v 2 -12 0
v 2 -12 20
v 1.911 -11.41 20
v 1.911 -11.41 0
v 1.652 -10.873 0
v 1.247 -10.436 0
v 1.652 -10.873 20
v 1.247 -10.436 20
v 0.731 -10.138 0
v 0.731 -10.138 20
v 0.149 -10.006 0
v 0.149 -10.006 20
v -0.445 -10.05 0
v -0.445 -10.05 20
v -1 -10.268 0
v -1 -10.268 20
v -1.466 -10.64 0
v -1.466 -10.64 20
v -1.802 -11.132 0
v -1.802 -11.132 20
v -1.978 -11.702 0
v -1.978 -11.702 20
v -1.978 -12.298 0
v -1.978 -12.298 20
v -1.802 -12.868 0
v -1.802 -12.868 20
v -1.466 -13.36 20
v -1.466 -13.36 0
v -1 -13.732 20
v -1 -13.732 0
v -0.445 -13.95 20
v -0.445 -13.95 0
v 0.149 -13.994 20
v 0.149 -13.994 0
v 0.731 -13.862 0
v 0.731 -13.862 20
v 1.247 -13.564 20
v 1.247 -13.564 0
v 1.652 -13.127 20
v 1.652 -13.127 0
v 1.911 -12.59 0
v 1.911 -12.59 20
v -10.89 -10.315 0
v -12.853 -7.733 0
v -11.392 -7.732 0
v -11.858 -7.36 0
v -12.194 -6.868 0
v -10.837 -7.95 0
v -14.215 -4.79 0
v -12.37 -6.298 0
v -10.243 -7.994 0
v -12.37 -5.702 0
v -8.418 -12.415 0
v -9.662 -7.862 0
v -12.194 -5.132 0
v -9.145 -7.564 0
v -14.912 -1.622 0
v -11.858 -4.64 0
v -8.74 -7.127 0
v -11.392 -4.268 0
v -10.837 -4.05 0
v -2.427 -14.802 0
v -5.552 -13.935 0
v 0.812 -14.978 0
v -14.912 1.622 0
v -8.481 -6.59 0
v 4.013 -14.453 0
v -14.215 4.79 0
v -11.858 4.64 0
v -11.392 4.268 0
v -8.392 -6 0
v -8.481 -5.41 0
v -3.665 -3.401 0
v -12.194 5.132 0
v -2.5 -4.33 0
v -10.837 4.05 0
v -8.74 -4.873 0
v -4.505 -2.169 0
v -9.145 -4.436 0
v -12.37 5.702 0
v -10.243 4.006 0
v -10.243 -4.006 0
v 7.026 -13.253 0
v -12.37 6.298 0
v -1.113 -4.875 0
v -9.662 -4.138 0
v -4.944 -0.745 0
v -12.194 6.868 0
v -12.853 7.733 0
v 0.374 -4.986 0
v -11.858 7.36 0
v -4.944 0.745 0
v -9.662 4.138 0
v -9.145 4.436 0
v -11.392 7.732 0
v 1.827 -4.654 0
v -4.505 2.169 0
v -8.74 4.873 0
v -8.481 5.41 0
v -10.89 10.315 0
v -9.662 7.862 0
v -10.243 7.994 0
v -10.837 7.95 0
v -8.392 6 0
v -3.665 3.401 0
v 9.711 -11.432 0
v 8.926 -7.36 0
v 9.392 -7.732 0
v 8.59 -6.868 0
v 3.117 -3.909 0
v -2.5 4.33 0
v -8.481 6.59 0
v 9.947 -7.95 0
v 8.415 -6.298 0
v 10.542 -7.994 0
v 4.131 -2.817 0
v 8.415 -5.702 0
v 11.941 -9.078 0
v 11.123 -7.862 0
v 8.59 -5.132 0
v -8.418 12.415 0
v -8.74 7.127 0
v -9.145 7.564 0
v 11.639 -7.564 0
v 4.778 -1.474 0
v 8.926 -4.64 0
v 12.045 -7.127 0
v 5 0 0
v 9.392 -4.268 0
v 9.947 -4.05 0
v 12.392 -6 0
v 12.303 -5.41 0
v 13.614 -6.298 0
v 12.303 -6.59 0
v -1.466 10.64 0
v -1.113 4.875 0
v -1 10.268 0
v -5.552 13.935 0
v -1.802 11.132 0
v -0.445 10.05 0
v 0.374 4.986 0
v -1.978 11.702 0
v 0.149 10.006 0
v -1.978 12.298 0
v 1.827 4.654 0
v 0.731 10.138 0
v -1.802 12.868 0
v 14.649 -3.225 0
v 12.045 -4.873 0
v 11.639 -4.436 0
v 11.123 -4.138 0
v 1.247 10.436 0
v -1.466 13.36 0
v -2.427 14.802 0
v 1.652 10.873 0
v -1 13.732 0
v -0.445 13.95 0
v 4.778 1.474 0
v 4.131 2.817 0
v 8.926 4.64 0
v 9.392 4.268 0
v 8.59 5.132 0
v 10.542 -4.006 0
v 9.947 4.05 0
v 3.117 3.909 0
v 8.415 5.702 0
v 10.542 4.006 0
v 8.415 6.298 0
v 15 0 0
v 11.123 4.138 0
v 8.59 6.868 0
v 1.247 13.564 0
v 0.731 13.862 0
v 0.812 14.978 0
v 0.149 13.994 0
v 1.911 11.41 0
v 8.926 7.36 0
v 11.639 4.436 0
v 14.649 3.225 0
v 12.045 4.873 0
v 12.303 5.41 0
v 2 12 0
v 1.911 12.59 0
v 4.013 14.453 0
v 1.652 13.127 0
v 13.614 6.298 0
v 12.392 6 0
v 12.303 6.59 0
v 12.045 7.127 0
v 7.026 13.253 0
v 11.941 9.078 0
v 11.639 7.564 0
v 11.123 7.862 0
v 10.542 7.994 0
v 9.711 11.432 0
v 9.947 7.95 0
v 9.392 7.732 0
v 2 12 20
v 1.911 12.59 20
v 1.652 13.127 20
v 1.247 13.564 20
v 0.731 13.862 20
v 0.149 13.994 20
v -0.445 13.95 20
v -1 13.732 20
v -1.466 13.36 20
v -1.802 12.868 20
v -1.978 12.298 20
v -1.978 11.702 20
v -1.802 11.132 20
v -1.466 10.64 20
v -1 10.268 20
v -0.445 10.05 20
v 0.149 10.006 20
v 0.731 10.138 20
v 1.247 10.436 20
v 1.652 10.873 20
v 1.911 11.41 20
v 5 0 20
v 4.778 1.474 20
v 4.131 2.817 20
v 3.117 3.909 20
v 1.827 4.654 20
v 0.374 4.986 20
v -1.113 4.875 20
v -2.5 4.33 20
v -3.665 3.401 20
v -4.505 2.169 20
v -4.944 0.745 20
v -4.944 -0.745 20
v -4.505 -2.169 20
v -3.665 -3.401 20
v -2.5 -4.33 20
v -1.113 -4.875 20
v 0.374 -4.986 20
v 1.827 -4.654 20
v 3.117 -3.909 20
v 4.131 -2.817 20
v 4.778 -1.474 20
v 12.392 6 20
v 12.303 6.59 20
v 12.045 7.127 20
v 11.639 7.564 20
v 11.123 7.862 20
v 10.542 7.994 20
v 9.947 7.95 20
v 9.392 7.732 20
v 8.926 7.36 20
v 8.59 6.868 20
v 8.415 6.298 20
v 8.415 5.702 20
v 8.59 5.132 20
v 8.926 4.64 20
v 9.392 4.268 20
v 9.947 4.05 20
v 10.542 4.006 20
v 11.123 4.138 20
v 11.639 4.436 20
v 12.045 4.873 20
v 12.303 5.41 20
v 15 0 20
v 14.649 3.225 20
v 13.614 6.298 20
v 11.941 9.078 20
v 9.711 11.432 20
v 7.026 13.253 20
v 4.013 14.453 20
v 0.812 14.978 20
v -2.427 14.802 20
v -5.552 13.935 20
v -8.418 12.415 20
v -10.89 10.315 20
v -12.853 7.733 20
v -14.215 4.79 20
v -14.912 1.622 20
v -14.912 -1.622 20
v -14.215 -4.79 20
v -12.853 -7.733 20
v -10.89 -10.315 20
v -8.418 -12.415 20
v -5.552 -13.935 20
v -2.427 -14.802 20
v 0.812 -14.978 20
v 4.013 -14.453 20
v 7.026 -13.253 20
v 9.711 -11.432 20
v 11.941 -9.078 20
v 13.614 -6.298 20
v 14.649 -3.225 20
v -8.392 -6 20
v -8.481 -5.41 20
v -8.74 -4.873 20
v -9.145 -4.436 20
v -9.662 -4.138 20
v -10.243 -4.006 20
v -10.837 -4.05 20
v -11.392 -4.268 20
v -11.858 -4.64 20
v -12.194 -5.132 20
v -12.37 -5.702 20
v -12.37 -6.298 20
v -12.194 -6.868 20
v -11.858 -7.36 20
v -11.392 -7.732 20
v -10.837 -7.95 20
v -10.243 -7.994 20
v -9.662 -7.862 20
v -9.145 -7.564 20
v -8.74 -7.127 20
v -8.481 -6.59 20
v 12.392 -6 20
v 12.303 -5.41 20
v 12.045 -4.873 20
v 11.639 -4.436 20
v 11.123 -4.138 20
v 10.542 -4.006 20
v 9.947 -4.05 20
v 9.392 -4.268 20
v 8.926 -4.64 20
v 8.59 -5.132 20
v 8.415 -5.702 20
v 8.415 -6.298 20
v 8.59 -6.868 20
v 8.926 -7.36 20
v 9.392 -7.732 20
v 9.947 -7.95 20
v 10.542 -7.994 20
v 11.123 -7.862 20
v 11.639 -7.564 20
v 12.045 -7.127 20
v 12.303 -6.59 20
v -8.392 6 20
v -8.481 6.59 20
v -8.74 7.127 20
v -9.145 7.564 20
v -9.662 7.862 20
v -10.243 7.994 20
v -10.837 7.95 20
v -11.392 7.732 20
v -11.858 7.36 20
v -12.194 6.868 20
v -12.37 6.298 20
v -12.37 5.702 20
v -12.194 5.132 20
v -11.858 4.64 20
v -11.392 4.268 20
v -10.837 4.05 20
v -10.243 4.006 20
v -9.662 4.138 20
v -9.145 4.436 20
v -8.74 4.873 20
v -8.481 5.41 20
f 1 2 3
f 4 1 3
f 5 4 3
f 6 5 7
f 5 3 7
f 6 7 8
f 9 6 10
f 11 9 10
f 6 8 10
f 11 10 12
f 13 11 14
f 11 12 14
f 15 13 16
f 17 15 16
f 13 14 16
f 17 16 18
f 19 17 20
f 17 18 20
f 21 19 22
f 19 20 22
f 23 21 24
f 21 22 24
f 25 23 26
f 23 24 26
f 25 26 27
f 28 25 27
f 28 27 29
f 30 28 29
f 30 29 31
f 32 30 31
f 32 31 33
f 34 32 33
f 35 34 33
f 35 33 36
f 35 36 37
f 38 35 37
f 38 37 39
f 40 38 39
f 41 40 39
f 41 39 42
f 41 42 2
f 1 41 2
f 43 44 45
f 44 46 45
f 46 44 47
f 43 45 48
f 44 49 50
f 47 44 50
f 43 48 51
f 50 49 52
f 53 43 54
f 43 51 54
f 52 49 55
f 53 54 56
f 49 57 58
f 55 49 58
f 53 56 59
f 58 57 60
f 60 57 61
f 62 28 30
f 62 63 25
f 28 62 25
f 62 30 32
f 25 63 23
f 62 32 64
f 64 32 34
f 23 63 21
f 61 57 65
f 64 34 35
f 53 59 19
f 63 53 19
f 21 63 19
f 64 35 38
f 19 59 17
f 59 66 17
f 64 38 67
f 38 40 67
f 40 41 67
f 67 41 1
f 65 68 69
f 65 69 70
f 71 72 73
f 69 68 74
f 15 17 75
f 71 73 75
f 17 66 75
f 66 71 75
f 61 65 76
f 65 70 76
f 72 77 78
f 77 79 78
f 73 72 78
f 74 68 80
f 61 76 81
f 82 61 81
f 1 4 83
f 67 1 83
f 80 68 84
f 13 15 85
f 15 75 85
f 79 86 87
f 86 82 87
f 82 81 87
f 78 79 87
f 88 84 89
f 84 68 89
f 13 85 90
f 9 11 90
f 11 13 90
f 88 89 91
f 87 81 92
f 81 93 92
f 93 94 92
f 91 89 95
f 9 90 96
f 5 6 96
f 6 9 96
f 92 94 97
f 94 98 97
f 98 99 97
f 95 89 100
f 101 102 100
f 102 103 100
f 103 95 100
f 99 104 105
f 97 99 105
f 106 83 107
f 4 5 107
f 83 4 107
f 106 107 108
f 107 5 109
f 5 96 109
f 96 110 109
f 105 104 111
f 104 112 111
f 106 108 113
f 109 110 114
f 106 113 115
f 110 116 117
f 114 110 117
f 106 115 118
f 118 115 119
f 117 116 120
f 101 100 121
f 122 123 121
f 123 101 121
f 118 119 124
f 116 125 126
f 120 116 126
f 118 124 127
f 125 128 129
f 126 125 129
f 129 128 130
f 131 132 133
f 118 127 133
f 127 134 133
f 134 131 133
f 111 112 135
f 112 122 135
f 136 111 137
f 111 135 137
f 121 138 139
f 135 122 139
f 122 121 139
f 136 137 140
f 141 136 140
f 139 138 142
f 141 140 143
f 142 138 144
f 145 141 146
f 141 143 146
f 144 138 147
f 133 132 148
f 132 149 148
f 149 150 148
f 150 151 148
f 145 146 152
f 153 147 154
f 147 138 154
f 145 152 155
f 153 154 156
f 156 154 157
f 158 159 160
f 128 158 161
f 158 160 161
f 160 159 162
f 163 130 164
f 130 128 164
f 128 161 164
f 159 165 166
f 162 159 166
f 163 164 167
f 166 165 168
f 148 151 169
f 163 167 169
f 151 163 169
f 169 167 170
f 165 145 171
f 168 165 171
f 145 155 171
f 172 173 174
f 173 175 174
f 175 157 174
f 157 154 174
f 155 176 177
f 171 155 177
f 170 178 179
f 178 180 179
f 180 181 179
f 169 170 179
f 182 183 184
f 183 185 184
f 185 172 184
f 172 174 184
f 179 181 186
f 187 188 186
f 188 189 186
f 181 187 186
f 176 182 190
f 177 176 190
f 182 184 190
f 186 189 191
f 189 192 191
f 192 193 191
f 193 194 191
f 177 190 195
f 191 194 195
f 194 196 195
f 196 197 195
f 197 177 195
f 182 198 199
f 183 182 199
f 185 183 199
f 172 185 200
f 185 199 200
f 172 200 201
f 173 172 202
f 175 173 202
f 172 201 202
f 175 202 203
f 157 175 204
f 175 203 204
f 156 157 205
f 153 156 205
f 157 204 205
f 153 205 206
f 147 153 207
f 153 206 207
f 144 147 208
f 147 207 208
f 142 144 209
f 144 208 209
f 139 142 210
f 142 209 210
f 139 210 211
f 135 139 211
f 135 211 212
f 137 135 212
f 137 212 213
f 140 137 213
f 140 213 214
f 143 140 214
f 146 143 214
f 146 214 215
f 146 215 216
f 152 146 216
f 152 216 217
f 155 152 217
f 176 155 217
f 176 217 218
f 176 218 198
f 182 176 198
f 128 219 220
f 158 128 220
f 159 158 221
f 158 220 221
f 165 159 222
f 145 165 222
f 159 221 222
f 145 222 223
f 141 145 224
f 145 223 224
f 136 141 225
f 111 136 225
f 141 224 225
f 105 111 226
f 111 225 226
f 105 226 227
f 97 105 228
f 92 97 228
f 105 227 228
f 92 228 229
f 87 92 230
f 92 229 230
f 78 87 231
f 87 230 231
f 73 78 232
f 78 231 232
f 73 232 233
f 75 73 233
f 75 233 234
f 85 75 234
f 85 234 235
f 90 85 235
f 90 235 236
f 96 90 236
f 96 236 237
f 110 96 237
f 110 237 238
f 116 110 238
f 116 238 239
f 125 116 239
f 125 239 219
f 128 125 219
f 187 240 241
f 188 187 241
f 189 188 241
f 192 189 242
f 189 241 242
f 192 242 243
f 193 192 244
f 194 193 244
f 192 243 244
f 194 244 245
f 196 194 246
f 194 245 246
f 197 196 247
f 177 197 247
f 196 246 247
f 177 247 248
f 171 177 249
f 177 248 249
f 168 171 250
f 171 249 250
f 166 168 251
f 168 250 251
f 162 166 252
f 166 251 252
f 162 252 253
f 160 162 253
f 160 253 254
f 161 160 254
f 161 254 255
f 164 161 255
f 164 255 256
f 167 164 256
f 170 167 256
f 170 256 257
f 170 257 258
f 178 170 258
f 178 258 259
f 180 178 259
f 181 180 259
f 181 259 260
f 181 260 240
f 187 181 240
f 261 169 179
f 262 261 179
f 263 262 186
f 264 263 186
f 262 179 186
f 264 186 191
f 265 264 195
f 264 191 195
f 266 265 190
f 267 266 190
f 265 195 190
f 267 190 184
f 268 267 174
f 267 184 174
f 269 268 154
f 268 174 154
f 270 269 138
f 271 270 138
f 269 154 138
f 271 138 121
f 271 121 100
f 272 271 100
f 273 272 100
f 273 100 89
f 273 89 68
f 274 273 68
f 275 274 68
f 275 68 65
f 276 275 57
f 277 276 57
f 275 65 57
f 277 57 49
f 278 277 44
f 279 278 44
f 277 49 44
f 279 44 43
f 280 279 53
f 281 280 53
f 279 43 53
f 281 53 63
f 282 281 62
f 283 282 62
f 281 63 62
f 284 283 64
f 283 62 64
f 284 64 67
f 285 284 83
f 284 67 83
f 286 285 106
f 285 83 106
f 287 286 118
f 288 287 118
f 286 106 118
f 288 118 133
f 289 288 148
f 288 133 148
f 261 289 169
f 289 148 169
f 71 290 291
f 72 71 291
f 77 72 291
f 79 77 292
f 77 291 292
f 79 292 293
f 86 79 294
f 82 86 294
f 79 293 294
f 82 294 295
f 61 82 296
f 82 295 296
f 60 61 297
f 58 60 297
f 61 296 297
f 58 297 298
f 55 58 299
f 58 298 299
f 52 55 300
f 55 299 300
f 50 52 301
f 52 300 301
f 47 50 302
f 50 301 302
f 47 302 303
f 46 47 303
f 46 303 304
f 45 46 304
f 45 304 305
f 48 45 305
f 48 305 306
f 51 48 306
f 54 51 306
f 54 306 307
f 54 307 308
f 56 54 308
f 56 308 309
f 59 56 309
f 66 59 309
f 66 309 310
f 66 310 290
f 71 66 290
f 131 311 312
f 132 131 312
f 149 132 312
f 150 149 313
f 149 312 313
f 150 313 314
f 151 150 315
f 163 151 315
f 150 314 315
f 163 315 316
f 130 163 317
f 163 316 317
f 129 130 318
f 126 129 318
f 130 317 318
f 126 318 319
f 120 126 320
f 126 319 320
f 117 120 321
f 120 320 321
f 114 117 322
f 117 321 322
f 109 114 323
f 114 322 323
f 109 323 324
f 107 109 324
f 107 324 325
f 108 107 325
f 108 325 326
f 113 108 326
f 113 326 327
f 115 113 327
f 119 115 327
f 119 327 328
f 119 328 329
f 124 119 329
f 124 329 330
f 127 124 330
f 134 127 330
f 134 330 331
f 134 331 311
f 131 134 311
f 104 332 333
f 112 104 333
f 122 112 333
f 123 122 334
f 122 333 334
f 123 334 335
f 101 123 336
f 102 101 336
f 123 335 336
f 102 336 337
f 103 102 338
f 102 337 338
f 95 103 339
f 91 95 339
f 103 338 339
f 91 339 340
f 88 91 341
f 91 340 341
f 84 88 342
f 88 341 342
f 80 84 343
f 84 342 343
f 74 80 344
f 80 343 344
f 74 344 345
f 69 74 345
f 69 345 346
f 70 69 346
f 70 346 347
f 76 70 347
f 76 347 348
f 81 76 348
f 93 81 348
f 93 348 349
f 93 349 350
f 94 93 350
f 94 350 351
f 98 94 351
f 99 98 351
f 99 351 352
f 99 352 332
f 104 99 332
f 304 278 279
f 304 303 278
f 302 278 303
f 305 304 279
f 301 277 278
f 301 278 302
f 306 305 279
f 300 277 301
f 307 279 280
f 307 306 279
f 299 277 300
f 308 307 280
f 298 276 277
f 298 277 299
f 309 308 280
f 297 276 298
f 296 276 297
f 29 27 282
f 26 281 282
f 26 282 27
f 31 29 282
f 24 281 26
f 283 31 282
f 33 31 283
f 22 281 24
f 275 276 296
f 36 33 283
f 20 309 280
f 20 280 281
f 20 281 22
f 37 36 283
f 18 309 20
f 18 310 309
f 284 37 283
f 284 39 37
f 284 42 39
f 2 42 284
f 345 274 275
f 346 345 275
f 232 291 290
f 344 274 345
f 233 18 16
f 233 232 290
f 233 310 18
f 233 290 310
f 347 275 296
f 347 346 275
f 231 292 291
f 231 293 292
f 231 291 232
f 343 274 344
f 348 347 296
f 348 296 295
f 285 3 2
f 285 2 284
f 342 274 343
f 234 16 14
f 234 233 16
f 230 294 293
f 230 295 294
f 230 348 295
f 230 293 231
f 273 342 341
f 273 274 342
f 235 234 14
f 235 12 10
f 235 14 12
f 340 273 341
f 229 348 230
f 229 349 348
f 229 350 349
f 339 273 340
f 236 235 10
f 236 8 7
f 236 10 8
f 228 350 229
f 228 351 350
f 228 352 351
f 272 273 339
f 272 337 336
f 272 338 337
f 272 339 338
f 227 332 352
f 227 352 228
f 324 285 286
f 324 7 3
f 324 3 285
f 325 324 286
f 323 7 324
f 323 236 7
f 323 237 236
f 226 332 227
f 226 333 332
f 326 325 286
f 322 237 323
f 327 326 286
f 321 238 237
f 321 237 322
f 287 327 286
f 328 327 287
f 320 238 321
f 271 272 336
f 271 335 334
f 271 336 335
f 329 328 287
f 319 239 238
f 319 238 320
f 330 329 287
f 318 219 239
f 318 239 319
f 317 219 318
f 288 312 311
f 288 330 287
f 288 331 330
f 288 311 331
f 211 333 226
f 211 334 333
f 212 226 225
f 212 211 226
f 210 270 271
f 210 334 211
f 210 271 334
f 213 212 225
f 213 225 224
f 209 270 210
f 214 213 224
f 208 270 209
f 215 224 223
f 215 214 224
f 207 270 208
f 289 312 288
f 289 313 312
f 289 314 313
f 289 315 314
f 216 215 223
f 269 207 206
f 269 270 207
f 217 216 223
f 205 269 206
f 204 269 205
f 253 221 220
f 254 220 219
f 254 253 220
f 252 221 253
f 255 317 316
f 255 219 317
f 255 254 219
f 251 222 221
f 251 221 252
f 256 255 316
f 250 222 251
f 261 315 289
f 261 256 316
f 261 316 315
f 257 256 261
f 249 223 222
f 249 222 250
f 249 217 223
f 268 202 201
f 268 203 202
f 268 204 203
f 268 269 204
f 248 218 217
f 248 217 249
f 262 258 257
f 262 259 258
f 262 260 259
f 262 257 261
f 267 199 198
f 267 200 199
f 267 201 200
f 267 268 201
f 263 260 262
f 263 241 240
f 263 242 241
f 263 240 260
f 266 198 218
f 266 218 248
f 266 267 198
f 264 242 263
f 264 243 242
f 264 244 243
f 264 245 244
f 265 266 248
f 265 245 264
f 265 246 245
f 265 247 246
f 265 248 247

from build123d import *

# Parameters (mm, degrees)
SKETCH1_R           = 15
BOSS_EXTRUDE1_DEPTH = 20
SKETCH2_R           = 5
SKETCH2_R_2         = 2
CUT_EXTRUDE1_DEPTH  = 30.154759474


with BuildPart() as part:
    # Sketch1 → Boss-Extrude1 (new body)
    with BuildSketch(Plane.XY):
        Circle(SKETCH1_R)
    extrude(amount=BOSS_EXTRUDE1_DEPTH)

    # Sketch2 → Cut-Extrude1 (cut, through all)
    with BuildSketch(Plane.XY.offset(20)):
        Circle(SKETCH2_R)
        with Locations((0, 12)):
            Circle(SKETCH2_R_2)
        with Locations((10.392304845, 6)):
            Circle(SKETCH2_R_2)
        with Locations((10.392304845, -6)):
            Circle(SKETCH2_R_2)
        with Locations((0, -12)):
            Circle(SKETCH2_R_2)
        with Locations((-10.392304845, -6)):
            Circle(SKETCH2_R_2)
        with Locations((-10.392304845, 6)):
            Circle(SKETCH2_R_2)
    extrude(amount=-CUT_EXTRUDE1_DEPTH, mode=Mode.SUBTRACT)


solid = part.part
